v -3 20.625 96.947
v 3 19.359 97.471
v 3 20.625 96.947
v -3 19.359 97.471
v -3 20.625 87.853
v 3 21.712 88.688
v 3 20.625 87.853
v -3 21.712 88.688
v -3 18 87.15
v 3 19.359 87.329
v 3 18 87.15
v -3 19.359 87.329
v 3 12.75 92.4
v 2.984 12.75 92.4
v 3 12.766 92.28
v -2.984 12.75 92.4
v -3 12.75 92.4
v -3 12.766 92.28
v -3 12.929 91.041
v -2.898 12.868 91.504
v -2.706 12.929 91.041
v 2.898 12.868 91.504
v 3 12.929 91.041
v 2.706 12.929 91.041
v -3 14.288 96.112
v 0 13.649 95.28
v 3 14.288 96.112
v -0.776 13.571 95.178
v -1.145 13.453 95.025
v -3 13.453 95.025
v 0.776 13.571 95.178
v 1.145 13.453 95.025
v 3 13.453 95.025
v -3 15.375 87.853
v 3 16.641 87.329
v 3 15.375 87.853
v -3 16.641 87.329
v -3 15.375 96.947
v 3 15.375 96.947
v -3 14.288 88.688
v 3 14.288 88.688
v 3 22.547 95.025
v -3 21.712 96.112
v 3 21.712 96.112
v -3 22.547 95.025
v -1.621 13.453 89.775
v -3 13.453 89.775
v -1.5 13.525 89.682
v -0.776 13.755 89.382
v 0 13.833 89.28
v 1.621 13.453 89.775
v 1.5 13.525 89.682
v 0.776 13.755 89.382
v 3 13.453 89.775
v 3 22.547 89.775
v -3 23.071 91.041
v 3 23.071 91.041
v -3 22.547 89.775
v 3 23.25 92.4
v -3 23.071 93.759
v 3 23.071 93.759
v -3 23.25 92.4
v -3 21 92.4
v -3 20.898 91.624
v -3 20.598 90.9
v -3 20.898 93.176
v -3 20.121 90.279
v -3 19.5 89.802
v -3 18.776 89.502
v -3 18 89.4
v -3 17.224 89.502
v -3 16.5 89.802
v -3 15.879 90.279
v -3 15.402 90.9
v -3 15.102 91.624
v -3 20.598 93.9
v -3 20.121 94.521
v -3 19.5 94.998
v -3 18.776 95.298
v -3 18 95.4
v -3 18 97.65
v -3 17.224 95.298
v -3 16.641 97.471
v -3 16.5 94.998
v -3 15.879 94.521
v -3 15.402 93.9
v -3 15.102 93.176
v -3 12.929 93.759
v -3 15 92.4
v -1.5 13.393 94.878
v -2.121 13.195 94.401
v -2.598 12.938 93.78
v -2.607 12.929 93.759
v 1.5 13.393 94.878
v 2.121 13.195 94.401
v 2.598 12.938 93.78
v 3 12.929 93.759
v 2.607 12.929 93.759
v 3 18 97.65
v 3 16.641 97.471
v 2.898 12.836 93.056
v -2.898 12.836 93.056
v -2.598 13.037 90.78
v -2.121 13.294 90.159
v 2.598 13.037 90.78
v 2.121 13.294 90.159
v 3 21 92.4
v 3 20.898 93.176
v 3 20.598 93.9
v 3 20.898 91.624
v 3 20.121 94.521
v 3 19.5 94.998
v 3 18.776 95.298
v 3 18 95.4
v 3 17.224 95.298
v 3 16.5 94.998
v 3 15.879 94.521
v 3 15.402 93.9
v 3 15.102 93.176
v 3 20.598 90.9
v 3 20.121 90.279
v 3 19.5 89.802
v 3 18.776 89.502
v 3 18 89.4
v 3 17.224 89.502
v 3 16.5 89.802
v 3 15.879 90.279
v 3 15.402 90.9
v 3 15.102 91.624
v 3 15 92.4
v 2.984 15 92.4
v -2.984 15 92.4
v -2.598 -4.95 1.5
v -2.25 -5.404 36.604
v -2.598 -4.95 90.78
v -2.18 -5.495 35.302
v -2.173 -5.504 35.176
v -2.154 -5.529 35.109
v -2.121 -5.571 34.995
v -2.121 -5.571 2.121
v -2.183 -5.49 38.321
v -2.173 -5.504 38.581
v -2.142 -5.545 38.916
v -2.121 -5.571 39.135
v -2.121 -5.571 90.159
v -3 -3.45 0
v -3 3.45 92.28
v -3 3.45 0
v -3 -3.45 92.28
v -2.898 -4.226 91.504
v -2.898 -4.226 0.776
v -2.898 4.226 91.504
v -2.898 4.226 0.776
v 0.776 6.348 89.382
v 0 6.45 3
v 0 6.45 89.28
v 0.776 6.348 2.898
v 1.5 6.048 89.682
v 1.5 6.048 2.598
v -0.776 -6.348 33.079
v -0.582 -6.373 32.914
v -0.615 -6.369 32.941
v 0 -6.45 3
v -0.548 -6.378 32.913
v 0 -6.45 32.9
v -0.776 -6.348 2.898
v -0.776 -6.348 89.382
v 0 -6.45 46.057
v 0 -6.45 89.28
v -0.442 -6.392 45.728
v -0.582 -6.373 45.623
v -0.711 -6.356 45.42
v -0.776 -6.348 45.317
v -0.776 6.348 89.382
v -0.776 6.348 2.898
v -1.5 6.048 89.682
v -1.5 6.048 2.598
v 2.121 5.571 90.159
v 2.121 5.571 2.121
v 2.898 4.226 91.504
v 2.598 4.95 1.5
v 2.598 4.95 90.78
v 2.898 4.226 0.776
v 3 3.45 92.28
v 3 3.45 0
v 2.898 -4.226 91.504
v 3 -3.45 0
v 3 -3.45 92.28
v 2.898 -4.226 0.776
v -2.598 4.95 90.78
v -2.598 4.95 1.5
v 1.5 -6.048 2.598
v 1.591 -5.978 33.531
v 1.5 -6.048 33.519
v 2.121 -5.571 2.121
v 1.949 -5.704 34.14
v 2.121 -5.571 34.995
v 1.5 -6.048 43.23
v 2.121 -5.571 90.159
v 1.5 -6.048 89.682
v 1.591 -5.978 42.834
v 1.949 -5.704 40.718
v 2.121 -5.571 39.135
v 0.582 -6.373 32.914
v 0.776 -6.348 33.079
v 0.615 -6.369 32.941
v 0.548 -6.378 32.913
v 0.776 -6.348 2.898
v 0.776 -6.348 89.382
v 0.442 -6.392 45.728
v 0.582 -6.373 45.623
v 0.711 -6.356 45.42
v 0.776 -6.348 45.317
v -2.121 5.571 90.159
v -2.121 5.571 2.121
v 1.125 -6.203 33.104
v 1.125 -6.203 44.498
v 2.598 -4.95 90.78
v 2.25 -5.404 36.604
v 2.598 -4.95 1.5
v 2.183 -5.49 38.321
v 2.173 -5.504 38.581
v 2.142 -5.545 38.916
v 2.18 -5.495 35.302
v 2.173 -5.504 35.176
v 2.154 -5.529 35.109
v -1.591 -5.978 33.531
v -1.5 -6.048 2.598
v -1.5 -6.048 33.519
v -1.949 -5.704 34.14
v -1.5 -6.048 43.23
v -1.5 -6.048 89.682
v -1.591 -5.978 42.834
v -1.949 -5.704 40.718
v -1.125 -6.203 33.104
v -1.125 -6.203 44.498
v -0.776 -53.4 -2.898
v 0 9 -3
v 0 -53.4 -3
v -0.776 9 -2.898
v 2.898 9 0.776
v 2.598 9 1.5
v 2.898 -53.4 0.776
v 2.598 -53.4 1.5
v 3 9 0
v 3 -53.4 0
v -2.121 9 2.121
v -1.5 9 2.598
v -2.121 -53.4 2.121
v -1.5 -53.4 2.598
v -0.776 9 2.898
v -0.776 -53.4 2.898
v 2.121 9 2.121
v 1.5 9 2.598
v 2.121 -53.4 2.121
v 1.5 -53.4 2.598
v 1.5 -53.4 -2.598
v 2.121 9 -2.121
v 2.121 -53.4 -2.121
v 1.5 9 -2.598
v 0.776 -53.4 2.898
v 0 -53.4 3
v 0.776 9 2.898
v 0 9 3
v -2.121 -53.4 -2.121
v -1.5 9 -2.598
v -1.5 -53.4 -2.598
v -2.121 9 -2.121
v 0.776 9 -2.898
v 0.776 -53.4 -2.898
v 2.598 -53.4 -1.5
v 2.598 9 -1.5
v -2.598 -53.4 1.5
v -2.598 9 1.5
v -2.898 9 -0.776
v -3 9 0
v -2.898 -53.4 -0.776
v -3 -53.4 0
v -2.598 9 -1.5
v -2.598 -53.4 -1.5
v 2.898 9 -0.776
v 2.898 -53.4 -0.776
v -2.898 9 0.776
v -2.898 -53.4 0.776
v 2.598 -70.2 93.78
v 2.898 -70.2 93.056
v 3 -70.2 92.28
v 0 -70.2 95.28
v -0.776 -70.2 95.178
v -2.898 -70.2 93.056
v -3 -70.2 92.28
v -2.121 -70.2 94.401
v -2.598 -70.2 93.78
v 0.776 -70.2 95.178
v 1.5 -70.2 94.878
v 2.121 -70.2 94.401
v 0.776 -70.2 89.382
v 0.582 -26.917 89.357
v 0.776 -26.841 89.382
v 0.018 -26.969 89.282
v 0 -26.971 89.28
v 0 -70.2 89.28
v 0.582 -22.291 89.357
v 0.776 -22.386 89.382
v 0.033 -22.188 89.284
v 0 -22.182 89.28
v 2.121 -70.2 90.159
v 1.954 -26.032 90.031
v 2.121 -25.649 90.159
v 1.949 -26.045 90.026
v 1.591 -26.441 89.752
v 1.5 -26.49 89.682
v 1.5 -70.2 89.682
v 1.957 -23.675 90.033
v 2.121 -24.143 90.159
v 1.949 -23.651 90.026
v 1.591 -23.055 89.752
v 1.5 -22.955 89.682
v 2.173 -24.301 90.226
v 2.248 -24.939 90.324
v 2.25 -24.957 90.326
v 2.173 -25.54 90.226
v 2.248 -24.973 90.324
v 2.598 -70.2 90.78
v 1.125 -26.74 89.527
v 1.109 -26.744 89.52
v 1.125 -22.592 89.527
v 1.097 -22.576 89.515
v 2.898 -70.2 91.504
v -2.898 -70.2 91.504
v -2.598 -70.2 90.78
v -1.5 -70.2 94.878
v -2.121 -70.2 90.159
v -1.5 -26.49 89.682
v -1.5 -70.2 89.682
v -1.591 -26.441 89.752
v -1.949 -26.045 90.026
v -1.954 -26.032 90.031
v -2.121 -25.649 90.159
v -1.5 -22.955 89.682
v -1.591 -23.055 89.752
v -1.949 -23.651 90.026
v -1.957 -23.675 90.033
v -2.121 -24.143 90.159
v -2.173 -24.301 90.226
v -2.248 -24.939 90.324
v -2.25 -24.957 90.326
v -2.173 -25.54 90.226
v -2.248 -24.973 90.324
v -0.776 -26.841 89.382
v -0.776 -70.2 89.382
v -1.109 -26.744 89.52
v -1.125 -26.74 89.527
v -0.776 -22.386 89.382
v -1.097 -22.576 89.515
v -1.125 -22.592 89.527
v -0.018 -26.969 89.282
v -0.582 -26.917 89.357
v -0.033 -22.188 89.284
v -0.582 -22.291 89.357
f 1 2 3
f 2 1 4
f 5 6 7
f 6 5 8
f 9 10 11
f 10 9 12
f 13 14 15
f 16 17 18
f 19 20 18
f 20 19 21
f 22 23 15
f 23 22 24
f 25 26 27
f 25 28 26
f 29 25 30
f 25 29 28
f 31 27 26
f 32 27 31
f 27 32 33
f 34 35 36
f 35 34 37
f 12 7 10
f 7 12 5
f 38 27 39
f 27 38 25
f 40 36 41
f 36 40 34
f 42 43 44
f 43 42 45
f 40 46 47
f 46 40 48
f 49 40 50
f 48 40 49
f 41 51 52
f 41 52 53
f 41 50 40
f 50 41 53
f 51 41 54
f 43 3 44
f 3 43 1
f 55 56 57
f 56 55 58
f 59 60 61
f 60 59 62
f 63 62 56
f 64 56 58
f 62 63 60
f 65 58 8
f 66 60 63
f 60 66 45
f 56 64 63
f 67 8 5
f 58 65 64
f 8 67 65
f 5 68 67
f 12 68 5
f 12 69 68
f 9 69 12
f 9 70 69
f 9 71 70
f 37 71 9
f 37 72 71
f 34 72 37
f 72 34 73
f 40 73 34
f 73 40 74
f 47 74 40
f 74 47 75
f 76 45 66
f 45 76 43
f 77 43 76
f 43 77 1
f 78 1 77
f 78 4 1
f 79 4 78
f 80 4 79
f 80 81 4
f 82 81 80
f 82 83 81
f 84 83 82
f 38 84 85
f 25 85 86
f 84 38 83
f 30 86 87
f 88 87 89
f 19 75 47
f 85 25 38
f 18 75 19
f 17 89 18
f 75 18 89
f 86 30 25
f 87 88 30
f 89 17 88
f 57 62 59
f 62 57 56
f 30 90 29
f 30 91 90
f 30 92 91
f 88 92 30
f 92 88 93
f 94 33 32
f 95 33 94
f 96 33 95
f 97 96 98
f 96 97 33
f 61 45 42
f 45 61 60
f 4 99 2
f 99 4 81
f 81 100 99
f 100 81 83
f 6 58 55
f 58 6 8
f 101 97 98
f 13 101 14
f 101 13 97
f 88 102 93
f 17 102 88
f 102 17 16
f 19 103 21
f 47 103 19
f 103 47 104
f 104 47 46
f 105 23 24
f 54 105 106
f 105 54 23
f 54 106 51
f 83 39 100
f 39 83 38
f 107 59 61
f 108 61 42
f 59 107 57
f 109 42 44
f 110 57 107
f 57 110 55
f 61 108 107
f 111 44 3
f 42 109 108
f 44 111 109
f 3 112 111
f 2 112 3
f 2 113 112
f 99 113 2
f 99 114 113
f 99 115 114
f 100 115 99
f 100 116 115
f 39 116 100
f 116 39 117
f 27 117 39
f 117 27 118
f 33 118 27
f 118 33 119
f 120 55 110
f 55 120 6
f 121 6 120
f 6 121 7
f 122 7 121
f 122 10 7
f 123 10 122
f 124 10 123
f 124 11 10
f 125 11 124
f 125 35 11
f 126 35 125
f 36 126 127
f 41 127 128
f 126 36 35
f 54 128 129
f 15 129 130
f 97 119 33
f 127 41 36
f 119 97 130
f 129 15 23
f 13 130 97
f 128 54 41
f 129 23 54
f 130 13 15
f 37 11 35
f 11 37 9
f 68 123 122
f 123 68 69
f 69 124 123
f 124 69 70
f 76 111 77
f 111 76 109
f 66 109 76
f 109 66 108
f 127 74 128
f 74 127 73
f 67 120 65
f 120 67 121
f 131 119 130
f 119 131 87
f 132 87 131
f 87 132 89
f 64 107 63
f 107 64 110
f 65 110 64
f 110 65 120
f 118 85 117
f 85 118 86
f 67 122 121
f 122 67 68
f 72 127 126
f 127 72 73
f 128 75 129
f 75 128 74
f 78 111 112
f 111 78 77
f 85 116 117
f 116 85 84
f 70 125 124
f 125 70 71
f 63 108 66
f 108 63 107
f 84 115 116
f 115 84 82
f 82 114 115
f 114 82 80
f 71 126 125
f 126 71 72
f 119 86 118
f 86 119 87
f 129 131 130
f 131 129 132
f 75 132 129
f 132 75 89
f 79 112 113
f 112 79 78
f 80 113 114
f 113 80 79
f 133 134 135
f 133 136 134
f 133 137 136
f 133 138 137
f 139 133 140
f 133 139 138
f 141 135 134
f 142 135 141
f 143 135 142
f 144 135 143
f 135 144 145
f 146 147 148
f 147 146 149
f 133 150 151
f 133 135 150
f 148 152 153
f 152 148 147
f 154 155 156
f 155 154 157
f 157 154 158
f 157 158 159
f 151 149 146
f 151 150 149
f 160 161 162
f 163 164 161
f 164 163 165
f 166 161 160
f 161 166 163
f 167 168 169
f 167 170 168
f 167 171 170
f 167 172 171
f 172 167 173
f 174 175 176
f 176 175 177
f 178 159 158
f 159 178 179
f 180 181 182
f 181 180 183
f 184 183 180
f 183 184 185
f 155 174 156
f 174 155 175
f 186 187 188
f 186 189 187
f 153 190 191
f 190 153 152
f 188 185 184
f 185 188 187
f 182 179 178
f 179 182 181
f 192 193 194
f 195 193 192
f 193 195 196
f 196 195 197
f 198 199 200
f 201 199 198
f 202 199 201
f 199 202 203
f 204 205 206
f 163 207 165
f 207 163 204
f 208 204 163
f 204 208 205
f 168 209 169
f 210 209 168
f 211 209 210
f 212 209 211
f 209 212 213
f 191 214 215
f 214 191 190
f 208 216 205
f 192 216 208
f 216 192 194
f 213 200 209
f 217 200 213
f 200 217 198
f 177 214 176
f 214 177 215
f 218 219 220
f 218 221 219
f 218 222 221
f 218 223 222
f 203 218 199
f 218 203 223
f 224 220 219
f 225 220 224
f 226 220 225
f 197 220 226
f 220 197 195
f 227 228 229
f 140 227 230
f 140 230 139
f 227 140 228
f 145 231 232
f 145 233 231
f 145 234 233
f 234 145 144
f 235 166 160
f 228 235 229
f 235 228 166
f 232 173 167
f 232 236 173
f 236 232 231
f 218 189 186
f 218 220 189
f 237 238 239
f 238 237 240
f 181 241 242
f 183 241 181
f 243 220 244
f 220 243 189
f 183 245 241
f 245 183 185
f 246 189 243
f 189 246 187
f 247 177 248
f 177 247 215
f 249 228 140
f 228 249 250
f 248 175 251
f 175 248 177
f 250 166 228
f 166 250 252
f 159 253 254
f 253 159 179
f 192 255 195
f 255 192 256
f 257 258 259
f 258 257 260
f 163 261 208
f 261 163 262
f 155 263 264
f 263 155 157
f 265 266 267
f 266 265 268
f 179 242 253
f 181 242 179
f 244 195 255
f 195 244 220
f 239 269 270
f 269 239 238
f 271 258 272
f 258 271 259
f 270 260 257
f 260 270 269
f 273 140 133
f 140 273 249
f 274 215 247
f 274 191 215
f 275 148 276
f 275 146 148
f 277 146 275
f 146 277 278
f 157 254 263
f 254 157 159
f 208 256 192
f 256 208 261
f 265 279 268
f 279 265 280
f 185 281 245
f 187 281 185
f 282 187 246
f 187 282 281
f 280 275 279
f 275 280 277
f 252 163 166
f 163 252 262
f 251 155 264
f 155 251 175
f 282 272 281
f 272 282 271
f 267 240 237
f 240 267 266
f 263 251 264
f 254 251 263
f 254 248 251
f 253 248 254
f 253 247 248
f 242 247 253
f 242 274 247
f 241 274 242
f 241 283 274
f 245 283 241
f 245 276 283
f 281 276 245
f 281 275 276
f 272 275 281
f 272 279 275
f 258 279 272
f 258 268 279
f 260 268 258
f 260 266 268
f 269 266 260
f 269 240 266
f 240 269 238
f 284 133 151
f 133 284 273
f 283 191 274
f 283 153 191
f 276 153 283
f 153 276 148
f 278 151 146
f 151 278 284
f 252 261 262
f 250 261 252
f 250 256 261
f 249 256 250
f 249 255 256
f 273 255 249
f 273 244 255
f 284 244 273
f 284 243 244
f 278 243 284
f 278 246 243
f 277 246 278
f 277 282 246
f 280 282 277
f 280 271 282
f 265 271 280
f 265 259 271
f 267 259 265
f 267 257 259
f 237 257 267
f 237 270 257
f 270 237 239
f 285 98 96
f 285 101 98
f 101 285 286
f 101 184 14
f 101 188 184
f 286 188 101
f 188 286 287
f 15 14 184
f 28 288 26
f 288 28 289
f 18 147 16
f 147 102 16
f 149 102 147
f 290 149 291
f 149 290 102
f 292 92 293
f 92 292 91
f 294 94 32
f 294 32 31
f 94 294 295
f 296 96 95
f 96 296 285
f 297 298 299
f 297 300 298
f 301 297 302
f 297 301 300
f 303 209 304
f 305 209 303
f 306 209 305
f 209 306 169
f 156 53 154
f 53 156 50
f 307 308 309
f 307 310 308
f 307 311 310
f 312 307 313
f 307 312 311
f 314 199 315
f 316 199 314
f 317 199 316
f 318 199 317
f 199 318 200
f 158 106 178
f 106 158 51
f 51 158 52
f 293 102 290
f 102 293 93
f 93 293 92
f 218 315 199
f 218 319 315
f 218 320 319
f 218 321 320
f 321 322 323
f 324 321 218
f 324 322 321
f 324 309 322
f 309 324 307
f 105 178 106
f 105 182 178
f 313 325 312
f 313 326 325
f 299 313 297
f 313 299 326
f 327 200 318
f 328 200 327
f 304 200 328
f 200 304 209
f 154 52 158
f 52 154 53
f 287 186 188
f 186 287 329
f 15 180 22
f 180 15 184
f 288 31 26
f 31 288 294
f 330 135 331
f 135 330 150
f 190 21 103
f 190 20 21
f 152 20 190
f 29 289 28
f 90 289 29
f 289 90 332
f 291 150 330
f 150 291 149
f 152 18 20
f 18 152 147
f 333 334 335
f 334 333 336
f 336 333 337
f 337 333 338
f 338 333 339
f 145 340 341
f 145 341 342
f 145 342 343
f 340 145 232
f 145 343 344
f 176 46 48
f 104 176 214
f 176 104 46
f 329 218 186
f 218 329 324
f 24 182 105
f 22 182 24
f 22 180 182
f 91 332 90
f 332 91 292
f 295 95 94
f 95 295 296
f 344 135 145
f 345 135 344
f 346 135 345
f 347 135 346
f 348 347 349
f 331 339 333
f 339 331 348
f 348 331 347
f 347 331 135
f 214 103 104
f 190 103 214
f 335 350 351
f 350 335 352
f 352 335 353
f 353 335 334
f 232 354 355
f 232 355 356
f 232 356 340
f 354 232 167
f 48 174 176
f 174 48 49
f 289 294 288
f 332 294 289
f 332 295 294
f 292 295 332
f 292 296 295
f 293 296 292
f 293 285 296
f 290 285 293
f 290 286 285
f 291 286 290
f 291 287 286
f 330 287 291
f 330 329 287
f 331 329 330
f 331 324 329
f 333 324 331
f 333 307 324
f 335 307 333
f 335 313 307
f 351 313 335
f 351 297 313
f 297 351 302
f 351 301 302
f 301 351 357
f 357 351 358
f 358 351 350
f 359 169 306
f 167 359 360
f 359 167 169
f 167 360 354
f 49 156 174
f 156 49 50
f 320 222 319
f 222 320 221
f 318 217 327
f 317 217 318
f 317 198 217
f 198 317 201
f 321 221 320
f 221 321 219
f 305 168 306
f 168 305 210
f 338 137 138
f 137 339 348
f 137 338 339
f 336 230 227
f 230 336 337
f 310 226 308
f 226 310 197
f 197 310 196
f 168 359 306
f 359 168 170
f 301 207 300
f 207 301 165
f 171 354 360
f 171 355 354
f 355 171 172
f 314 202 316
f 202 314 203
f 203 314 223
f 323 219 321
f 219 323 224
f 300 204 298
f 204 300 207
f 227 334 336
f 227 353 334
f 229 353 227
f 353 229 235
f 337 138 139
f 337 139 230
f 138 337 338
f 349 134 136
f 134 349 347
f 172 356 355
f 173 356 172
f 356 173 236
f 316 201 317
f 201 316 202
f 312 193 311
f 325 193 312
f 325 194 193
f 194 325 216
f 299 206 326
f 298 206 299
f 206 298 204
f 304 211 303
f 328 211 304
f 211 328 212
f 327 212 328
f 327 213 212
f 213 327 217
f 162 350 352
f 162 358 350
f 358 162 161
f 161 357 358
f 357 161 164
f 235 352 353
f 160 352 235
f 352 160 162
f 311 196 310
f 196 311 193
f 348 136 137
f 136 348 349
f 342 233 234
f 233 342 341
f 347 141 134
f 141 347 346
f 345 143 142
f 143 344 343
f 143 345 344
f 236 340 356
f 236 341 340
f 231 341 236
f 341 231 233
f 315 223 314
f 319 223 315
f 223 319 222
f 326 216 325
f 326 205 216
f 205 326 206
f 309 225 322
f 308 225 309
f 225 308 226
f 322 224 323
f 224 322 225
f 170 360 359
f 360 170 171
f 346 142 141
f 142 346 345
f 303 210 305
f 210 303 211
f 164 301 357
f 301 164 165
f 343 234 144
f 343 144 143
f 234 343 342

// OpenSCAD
module MK2_main_tube(_fn=24,scale=3) {
  R_length = 15.38*2*scale;
  
  linear_extrude(height=R_length)
  union() {
    S_tube = [2, 2.3]*scale;
   
    translate(S_tube*-0.5)
      square(S_tube);
    
    translate(-S_tube/2 + [1, 0]*scale)
    circle(scale,$fn=_fn);

    translate(-S_tube/2 + [1, 2.3]*scale)
    circle(scale,$fn=_fn);
  }
}

module MK2_head_tube(_fn=24, scale=3) {
  translate([0,3,0]*scale)
  rotate([90,0,0])
    cylinder(r=scale, h=10.4*2*scale, $fn=_fn);
}

module MK2_seat_tube(_fn=24,scale=3) {
  translate([0,5,15.38*2]*scale)
  rotate([90,0,0])
    cylinder(r=scale, h=14.2*2*scale, $fn=_fn);
}

module MK2_top_tube(_fn=24,scale=3) {
  translate([0,-1,10]*scale)
  rotate([20,0,0])
    cylinder(r=0.75*scale, h=22*scale, $fn=_fn);
}

module MK2_bottom_bracket_shell(_fn=24,scale=3) {
  height=2;
 
  translate([0,6,30.8]*scale)
  rotate([0,90,0])
  difference() {
    translate([0,0,height*-.5]*scale)
    cylinder(r=1.75*scale, h=height*scale, $fn=_fn);
    
    translate([0,0,6*-.5]*scale)
    cylinder(r=scale, h=6*scale, $fn=_fn);
  }
}

module MK2_main_frame() {
  union() {
    MK2_main_tube();
    MK2_head_tube();
    MK2_seat_tube();
    MK2_top_tube();
    MK2_bottom_bracket_shell();
  }
}





MK2_main_frame();

MK2_seat_tube();
